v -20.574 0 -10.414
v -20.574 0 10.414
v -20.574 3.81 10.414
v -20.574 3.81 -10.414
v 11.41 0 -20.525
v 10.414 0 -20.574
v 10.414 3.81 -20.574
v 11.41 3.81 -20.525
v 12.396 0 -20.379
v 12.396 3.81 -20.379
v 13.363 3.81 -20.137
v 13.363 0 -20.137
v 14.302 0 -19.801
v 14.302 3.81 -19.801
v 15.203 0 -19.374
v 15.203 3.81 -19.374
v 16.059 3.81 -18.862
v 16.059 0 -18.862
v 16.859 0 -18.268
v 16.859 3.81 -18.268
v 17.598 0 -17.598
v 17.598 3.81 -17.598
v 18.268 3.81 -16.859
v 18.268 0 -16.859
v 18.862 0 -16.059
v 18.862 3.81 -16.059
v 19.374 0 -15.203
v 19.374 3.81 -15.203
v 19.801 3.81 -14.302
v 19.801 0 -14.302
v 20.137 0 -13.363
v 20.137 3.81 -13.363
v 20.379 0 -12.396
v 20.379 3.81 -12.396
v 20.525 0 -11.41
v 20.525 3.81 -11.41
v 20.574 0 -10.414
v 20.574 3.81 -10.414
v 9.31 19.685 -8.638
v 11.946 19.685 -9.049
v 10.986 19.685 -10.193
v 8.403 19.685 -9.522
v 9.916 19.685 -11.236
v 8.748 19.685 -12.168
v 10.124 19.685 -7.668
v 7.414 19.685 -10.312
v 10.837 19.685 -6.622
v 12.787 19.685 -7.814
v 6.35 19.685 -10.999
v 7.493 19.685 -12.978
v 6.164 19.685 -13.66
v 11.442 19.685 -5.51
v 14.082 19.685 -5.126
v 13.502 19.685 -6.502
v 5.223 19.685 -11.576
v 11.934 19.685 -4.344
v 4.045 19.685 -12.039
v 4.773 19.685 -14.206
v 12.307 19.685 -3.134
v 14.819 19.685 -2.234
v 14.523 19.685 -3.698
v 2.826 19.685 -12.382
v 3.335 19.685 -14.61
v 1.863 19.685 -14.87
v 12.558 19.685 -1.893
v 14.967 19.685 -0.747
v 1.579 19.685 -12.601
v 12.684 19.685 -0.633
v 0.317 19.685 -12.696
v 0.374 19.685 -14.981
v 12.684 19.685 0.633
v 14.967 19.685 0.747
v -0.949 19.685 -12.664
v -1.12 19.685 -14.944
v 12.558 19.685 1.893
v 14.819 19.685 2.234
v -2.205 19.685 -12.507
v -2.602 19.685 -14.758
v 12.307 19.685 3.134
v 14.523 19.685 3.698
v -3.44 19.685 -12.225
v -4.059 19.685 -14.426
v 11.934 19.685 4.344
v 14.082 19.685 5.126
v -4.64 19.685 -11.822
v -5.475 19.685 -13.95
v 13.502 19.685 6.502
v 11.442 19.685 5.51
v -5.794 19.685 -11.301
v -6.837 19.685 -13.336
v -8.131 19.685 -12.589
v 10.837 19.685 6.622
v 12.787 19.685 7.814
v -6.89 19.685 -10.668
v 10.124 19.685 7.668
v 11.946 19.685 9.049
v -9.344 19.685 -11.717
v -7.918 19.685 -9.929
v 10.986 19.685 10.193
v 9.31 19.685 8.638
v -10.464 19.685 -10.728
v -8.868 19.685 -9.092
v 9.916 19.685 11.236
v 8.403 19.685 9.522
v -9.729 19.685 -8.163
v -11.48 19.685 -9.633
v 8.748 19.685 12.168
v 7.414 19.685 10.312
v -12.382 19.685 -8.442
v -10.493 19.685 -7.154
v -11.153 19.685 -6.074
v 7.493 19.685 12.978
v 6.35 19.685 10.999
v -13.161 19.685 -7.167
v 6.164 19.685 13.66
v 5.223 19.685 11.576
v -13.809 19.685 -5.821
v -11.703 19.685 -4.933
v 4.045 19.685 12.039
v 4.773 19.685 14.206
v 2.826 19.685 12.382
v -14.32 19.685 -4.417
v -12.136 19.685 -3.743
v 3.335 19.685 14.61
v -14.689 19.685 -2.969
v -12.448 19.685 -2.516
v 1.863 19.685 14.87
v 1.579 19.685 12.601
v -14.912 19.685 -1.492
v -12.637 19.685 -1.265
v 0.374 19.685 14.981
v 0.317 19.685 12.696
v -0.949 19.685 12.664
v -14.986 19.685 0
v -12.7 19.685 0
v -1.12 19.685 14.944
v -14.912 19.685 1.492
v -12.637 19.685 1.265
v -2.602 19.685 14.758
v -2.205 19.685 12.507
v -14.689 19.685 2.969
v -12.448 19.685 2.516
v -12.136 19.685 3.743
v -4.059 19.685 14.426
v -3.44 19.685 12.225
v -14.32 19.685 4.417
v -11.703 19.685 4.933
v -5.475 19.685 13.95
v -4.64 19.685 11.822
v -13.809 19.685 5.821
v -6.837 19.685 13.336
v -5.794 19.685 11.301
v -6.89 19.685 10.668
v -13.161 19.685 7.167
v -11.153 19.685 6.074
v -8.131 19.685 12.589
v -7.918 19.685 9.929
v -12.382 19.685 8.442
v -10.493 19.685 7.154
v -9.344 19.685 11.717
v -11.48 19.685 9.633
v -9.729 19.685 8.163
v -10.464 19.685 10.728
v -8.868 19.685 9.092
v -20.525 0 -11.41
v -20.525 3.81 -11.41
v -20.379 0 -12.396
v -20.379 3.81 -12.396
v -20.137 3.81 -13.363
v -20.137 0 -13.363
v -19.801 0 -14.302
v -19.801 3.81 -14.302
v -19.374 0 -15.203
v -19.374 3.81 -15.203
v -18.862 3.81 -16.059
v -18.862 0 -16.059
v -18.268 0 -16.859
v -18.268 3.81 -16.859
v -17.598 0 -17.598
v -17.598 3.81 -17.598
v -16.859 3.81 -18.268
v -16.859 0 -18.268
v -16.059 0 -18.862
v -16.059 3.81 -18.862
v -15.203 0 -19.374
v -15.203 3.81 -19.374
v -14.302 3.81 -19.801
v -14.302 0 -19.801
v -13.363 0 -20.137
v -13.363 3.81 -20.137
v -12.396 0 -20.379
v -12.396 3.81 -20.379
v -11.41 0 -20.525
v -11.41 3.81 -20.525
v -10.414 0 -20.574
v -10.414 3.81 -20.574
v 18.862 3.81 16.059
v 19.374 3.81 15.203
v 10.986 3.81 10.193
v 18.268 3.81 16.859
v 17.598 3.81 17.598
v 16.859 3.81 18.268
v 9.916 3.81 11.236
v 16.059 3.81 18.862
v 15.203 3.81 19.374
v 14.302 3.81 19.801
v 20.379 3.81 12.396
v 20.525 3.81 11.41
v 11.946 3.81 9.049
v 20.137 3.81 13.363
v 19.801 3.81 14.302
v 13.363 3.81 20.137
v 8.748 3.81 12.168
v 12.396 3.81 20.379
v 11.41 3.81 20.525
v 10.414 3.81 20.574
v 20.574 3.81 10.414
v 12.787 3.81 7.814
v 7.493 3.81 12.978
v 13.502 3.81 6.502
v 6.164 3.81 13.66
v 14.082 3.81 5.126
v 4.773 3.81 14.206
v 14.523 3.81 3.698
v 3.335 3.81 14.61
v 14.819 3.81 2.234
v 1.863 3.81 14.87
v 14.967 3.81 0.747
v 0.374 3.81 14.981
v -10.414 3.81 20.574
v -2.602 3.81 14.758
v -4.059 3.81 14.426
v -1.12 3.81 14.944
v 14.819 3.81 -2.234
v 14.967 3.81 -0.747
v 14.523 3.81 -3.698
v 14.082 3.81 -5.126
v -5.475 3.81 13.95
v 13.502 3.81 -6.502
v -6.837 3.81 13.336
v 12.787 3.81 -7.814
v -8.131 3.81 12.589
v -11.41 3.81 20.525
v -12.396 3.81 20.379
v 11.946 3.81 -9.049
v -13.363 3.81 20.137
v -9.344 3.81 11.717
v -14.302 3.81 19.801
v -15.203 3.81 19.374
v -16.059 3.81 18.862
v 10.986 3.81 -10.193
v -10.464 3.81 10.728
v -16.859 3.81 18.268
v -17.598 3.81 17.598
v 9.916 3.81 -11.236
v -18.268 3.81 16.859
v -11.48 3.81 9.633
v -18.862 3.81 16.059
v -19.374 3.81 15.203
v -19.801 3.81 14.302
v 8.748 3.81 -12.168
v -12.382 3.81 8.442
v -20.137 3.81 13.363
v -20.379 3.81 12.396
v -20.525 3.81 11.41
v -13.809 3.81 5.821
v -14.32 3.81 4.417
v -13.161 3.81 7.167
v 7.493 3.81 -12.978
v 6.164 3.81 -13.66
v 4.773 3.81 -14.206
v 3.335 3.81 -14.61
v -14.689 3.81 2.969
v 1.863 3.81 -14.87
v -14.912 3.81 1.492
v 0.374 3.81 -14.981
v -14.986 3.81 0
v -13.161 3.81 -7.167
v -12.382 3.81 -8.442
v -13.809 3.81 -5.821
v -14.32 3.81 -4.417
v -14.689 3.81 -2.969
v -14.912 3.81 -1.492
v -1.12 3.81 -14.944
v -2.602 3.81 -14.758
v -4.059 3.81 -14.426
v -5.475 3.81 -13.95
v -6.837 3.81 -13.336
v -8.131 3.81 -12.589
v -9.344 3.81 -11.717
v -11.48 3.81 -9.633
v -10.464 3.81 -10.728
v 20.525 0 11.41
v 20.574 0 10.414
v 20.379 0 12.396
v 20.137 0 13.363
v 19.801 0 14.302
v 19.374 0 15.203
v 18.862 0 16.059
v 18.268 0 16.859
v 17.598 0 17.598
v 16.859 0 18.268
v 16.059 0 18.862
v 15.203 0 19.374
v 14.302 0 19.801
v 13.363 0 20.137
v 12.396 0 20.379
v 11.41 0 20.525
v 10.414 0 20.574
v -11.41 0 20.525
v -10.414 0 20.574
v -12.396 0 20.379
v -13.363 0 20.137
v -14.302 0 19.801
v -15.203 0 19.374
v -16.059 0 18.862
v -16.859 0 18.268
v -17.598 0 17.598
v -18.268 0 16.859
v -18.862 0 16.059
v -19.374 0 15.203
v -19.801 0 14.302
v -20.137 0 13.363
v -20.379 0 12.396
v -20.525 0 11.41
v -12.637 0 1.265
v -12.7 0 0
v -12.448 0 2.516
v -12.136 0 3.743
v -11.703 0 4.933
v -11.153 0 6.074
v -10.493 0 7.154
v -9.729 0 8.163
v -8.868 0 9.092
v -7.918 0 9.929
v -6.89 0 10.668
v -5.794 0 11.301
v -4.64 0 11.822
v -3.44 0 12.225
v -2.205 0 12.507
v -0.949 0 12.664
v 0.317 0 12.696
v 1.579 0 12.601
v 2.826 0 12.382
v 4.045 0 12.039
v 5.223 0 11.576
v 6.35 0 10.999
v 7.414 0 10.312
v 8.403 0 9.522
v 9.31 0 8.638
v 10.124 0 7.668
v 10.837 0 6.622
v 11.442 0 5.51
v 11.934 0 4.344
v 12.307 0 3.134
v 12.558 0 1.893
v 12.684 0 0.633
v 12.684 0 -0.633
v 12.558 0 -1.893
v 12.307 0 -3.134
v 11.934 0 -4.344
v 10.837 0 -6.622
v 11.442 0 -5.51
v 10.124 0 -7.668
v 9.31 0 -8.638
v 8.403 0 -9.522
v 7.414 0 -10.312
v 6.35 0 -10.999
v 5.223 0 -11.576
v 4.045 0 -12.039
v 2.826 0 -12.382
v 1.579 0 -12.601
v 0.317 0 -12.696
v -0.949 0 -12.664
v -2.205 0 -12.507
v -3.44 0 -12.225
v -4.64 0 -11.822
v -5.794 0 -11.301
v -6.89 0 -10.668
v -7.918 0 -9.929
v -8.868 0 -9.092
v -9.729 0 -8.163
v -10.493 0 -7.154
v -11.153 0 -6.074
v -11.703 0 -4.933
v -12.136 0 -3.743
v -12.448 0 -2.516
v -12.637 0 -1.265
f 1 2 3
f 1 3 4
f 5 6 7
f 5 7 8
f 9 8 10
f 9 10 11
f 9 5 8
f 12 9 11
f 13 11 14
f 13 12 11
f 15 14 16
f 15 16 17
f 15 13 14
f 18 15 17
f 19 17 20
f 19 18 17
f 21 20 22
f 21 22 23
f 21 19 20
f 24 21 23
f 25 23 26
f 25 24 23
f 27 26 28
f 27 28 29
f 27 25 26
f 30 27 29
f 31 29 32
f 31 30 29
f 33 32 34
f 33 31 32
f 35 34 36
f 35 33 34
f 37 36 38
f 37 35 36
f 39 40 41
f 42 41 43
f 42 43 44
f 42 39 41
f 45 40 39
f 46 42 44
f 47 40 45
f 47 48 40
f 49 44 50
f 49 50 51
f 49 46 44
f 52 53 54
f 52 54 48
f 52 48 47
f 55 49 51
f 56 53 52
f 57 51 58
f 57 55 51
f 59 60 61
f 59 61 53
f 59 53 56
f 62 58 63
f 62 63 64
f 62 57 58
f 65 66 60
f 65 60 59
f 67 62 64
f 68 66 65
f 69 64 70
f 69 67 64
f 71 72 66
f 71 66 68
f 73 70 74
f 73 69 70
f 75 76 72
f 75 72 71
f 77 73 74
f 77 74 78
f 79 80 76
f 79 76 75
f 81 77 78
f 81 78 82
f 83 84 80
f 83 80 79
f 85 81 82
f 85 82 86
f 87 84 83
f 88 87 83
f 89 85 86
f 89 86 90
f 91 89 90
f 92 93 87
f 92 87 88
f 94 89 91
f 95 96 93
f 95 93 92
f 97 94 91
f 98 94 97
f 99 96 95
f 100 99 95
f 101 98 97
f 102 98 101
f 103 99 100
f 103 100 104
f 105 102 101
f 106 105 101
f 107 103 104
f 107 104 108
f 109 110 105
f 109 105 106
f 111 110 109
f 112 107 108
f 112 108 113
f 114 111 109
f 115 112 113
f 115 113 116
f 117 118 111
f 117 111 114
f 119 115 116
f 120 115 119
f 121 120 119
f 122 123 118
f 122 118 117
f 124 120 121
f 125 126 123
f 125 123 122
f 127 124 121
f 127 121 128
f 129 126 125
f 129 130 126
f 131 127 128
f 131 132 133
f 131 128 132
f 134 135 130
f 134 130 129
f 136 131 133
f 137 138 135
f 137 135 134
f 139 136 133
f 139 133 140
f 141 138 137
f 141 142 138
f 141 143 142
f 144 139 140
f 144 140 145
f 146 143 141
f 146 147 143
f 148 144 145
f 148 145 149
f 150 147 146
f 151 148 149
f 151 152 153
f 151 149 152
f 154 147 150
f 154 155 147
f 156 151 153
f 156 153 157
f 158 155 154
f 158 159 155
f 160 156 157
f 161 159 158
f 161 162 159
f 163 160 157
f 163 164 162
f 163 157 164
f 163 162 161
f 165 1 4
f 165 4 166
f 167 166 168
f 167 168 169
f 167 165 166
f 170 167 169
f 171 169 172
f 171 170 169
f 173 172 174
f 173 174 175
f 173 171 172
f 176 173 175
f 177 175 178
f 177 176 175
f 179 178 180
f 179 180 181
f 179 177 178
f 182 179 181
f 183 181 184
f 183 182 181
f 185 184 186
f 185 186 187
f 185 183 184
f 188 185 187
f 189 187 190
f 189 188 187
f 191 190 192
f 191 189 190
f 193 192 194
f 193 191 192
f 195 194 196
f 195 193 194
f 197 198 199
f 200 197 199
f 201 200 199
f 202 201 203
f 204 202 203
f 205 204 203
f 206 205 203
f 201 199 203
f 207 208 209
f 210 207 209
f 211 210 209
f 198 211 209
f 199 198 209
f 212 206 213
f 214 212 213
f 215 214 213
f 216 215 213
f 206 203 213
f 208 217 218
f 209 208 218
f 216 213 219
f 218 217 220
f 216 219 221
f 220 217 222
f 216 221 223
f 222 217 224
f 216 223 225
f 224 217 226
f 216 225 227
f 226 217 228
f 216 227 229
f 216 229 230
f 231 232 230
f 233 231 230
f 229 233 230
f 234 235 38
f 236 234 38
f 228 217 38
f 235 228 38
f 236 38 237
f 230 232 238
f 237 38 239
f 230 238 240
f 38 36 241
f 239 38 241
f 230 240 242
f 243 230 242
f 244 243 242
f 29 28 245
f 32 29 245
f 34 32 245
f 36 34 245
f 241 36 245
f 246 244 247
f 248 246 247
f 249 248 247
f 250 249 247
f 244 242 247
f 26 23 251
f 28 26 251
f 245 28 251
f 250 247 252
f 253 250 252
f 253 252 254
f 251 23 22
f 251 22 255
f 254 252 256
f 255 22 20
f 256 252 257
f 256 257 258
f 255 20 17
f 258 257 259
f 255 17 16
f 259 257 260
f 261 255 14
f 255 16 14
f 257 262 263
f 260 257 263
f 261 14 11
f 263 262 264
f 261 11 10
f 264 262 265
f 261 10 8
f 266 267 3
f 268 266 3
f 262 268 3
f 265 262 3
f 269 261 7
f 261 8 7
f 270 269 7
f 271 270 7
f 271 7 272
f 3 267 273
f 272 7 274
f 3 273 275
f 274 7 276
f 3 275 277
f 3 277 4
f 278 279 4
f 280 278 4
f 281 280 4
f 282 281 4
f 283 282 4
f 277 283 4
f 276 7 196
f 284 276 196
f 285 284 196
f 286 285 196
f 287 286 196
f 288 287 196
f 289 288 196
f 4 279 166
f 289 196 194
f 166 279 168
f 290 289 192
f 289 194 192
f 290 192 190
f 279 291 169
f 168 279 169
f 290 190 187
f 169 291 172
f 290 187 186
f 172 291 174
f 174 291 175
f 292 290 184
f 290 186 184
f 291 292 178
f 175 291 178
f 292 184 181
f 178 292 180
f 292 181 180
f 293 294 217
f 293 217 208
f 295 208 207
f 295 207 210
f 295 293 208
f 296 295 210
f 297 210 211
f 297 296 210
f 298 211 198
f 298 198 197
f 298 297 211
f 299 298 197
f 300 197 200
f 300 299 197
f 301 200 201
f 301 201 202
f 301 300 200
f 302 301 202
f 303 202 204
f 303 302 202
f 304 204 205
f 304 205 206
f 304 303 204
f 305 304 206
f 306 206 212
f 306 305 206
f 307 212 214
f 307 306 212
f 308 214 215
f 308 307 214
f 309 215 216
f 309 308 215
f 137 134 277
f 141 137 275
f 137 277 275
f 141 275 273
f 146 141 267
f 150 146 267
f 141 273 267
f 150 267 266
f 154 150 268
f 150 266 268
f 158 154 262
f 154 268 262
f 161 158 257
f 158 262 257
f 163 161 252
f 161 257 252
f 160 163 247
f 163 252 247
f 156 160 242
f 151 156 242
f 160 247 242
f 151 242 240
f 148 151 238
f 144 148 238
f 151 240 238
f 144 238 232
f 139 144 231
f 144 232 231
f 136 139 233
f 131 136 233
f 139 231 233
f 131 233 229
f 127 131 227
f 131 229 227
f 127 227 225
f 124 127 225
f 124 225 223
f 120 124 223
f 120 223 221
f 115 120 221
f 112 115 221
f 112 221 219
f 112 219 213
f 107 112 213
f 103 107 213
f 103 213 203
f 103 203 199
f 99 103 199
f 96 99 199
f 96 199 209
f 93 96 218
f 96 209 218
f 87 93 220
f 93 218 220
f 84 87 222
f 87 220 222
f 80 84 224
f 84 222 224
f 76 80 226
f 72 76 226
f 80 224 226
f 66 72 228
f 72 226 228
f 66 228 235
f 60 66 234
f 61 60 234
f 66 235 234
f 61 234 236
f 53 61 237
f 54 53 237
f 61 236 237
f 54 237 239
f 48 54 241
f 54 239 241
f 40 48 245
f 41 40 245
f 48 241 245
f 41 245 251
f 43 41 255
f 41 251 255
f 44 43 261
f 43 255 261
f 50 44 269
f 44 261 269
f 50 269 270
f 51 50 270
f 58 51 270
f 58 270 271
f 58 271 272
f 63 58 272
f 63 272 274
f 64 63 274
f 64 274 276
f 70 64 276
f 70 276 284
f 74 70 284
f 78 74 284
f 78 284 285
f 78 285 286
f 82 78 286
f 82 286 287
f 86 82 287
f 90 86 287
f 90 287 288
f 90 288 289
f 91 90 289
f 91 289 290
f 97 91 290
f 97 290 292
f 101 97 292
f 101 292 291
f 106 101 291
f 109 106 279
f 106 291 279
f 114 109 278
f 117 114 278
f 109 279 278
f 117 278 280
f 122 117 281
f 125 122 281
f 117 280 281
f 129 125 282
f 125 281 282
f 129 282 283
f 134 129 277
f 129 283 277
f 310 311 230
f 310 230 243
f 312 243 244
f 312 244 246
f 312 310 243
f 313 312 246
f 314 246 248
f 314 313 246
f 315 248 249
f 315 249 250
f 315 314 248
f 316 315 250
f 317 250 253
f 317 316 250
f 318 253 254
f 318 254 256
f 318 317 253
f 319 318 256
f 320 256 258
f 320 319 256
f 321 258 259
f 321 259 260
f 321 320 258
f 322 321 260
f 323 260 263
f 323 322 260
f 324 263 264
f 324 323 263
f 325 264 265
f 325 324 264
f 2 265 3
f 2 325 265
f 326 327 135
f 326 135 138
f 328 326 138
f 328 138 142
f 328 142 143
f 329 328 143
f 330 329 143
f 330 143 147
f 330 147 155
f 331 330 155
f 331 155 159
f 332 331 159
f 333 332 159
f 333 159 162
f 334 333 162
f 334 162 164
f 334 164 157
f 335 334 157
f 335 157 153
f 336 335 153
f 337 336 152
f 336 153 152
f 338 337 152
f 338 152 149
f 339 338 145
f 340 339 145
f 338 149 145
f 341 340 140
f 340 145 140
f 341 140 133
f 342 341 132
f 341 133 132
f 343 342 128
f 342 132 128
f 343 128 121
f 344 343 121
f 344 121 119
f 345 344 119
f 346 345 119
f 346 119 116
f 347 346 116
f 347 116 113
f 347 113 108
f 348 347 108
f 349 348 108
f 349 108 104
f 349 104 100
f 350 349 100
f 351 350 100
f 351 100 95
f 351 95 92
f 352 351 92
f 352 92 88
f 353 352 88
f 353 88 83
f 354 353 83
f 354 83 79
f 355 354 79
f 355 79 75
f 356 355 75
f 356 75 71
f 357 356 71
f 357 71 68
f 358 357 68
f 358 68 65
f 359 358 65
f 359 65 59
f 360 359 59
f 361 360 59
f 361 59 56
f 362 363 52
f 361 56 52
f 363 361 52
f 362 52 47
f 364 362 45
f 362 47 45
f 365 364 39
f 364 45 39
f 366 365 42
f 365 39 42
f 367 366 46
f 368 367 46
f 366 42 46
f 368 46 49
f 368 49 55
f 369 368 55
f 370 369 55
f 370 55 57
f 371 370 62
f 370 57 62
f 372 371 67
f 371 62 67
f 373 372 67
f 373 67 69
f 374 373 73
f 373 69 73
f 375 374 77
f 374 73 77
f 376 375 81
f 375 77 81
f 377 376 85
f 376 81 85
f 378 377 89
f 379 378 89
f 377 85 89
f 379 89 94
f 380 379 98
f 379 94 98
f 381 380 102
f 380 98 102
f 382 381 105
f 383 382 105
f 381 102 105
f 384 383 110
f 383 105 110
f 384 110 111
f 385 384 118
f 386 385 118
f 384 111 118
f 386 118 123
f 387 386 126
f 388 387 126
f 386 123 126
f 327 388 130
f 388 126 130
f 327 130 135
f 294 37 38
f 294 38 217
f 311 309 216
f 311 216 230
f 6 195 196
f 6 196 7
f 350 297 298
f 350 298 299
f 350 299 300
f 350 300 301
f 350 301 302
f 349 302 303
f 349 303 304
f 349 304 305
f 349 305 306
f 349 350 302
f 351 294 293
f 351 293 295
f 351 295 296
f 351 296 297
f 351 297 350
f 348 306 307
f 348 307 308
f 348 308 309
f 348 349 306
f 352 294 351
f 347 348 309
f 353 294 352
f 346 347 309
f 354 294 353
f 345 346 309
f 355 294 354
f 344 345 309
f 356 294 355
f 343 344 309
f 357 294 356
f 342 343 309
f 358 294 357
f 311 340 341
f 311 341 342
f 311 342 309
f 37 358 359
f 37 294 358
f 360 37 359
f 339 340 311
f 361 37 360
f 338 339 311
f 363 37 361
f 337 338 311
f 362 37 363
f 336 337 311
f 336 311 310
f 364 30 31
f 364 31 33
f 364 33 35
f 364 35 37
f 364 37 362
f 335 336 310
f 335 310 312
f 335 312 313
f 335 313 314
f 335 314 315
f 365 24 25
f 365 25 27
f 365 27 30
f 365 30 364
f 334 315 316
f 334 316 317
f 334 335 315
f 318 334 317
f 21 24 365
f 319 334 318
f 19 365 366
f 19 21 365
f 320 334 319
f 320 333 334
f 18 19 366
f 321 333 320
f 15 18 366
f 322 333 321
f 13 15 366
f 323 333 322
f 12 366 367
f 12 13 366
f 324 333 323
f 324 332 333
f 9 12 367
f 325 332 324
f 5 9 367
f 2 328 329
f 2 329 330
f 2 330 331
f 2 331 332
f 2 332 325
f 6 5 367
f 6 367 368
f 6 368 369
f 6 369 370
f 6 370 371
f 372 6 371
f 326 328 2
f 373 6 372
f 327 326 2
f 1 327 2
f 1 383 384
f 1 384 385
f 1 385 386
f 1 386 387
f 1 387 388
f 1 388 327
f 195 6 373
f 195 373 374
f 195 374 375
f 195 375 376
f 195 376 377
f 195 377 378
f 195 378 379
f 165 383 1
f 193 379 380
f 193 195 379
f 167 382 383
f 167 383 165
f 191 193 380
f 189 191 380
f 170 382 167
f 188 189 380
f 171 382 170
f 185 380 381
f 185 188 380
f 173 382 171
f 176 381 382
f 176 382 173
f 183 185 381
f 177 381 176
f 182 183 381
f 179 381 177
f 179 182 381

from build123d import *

# Parameters (mm, degrees)
BASE_EXTRUDE_DEPTH  = 3.81
SKETCH2_R           = 14.986
BOSS_EXTRUDE1_DEPTH = 15.875
SKETCH3_R           = 12.7
CUT_EXTRUDE1_DEPTH  = 20.685


with BuildPart() as part:
    # Sketch1 → Base-Extrude (new body)
    with BuildSketch(Plane(origin=(0, 0, 0), x_dir=(1, 0, 0), z_dir=(0, 1, 0))):
        with BuildLine():
            Line((-10.414, 20.574), (10.414, 20.574))
            ThreePointArc((10.414, 20.574), (17.598204897, 17.598204897), (20.574, 10.414))
            Line((20.574, 10.414), (20.574, -10.414))
            ThreePointArc((20.574, -10.414), (17.598204897, -17.598204897), (10.414, -20.574))
            Line((10.414, -20.574), (-10.414, -20.574))
            ThreePointArc((-10.414, -20.574), (-17.598204897, -17.598204897), (-20.574, -10.414))
            Line((-20.574, -10.414), (-20.574, 10.414))
            ThreePointArc((-20.574, 10.414), (-17.598204897, 17.598204897), (-10.414, 20.574))
        make_face()
    extrude(amount=BASE_EXTRUDE_DEPTH)

    # Sketch2 → Boss-Extrude1 (add)
    with BuildSketch(Plane(origin=(0, 3.81, 0), x_dir=(-1, 0, 0), z_dir=(0, 1, 0))):
        Circle(SKETCH2_R)
    extrude(amount=BOSS_EXTRUDE1_DEPTH)

    # Sketch3 → Cut-Extrude1 (cut, through all)
    with BuildSketch(Plane(origin=(0, 19.685, 0), x_dir=(-1, 0, 0), z_dir=(0, 1, 0))):
        Circle(SKETCH3_R)
    extrude(amount=-CUT_EXTRUDE1_DEPTH, mode=Mode.SUBTRACT)


solid = part.part
